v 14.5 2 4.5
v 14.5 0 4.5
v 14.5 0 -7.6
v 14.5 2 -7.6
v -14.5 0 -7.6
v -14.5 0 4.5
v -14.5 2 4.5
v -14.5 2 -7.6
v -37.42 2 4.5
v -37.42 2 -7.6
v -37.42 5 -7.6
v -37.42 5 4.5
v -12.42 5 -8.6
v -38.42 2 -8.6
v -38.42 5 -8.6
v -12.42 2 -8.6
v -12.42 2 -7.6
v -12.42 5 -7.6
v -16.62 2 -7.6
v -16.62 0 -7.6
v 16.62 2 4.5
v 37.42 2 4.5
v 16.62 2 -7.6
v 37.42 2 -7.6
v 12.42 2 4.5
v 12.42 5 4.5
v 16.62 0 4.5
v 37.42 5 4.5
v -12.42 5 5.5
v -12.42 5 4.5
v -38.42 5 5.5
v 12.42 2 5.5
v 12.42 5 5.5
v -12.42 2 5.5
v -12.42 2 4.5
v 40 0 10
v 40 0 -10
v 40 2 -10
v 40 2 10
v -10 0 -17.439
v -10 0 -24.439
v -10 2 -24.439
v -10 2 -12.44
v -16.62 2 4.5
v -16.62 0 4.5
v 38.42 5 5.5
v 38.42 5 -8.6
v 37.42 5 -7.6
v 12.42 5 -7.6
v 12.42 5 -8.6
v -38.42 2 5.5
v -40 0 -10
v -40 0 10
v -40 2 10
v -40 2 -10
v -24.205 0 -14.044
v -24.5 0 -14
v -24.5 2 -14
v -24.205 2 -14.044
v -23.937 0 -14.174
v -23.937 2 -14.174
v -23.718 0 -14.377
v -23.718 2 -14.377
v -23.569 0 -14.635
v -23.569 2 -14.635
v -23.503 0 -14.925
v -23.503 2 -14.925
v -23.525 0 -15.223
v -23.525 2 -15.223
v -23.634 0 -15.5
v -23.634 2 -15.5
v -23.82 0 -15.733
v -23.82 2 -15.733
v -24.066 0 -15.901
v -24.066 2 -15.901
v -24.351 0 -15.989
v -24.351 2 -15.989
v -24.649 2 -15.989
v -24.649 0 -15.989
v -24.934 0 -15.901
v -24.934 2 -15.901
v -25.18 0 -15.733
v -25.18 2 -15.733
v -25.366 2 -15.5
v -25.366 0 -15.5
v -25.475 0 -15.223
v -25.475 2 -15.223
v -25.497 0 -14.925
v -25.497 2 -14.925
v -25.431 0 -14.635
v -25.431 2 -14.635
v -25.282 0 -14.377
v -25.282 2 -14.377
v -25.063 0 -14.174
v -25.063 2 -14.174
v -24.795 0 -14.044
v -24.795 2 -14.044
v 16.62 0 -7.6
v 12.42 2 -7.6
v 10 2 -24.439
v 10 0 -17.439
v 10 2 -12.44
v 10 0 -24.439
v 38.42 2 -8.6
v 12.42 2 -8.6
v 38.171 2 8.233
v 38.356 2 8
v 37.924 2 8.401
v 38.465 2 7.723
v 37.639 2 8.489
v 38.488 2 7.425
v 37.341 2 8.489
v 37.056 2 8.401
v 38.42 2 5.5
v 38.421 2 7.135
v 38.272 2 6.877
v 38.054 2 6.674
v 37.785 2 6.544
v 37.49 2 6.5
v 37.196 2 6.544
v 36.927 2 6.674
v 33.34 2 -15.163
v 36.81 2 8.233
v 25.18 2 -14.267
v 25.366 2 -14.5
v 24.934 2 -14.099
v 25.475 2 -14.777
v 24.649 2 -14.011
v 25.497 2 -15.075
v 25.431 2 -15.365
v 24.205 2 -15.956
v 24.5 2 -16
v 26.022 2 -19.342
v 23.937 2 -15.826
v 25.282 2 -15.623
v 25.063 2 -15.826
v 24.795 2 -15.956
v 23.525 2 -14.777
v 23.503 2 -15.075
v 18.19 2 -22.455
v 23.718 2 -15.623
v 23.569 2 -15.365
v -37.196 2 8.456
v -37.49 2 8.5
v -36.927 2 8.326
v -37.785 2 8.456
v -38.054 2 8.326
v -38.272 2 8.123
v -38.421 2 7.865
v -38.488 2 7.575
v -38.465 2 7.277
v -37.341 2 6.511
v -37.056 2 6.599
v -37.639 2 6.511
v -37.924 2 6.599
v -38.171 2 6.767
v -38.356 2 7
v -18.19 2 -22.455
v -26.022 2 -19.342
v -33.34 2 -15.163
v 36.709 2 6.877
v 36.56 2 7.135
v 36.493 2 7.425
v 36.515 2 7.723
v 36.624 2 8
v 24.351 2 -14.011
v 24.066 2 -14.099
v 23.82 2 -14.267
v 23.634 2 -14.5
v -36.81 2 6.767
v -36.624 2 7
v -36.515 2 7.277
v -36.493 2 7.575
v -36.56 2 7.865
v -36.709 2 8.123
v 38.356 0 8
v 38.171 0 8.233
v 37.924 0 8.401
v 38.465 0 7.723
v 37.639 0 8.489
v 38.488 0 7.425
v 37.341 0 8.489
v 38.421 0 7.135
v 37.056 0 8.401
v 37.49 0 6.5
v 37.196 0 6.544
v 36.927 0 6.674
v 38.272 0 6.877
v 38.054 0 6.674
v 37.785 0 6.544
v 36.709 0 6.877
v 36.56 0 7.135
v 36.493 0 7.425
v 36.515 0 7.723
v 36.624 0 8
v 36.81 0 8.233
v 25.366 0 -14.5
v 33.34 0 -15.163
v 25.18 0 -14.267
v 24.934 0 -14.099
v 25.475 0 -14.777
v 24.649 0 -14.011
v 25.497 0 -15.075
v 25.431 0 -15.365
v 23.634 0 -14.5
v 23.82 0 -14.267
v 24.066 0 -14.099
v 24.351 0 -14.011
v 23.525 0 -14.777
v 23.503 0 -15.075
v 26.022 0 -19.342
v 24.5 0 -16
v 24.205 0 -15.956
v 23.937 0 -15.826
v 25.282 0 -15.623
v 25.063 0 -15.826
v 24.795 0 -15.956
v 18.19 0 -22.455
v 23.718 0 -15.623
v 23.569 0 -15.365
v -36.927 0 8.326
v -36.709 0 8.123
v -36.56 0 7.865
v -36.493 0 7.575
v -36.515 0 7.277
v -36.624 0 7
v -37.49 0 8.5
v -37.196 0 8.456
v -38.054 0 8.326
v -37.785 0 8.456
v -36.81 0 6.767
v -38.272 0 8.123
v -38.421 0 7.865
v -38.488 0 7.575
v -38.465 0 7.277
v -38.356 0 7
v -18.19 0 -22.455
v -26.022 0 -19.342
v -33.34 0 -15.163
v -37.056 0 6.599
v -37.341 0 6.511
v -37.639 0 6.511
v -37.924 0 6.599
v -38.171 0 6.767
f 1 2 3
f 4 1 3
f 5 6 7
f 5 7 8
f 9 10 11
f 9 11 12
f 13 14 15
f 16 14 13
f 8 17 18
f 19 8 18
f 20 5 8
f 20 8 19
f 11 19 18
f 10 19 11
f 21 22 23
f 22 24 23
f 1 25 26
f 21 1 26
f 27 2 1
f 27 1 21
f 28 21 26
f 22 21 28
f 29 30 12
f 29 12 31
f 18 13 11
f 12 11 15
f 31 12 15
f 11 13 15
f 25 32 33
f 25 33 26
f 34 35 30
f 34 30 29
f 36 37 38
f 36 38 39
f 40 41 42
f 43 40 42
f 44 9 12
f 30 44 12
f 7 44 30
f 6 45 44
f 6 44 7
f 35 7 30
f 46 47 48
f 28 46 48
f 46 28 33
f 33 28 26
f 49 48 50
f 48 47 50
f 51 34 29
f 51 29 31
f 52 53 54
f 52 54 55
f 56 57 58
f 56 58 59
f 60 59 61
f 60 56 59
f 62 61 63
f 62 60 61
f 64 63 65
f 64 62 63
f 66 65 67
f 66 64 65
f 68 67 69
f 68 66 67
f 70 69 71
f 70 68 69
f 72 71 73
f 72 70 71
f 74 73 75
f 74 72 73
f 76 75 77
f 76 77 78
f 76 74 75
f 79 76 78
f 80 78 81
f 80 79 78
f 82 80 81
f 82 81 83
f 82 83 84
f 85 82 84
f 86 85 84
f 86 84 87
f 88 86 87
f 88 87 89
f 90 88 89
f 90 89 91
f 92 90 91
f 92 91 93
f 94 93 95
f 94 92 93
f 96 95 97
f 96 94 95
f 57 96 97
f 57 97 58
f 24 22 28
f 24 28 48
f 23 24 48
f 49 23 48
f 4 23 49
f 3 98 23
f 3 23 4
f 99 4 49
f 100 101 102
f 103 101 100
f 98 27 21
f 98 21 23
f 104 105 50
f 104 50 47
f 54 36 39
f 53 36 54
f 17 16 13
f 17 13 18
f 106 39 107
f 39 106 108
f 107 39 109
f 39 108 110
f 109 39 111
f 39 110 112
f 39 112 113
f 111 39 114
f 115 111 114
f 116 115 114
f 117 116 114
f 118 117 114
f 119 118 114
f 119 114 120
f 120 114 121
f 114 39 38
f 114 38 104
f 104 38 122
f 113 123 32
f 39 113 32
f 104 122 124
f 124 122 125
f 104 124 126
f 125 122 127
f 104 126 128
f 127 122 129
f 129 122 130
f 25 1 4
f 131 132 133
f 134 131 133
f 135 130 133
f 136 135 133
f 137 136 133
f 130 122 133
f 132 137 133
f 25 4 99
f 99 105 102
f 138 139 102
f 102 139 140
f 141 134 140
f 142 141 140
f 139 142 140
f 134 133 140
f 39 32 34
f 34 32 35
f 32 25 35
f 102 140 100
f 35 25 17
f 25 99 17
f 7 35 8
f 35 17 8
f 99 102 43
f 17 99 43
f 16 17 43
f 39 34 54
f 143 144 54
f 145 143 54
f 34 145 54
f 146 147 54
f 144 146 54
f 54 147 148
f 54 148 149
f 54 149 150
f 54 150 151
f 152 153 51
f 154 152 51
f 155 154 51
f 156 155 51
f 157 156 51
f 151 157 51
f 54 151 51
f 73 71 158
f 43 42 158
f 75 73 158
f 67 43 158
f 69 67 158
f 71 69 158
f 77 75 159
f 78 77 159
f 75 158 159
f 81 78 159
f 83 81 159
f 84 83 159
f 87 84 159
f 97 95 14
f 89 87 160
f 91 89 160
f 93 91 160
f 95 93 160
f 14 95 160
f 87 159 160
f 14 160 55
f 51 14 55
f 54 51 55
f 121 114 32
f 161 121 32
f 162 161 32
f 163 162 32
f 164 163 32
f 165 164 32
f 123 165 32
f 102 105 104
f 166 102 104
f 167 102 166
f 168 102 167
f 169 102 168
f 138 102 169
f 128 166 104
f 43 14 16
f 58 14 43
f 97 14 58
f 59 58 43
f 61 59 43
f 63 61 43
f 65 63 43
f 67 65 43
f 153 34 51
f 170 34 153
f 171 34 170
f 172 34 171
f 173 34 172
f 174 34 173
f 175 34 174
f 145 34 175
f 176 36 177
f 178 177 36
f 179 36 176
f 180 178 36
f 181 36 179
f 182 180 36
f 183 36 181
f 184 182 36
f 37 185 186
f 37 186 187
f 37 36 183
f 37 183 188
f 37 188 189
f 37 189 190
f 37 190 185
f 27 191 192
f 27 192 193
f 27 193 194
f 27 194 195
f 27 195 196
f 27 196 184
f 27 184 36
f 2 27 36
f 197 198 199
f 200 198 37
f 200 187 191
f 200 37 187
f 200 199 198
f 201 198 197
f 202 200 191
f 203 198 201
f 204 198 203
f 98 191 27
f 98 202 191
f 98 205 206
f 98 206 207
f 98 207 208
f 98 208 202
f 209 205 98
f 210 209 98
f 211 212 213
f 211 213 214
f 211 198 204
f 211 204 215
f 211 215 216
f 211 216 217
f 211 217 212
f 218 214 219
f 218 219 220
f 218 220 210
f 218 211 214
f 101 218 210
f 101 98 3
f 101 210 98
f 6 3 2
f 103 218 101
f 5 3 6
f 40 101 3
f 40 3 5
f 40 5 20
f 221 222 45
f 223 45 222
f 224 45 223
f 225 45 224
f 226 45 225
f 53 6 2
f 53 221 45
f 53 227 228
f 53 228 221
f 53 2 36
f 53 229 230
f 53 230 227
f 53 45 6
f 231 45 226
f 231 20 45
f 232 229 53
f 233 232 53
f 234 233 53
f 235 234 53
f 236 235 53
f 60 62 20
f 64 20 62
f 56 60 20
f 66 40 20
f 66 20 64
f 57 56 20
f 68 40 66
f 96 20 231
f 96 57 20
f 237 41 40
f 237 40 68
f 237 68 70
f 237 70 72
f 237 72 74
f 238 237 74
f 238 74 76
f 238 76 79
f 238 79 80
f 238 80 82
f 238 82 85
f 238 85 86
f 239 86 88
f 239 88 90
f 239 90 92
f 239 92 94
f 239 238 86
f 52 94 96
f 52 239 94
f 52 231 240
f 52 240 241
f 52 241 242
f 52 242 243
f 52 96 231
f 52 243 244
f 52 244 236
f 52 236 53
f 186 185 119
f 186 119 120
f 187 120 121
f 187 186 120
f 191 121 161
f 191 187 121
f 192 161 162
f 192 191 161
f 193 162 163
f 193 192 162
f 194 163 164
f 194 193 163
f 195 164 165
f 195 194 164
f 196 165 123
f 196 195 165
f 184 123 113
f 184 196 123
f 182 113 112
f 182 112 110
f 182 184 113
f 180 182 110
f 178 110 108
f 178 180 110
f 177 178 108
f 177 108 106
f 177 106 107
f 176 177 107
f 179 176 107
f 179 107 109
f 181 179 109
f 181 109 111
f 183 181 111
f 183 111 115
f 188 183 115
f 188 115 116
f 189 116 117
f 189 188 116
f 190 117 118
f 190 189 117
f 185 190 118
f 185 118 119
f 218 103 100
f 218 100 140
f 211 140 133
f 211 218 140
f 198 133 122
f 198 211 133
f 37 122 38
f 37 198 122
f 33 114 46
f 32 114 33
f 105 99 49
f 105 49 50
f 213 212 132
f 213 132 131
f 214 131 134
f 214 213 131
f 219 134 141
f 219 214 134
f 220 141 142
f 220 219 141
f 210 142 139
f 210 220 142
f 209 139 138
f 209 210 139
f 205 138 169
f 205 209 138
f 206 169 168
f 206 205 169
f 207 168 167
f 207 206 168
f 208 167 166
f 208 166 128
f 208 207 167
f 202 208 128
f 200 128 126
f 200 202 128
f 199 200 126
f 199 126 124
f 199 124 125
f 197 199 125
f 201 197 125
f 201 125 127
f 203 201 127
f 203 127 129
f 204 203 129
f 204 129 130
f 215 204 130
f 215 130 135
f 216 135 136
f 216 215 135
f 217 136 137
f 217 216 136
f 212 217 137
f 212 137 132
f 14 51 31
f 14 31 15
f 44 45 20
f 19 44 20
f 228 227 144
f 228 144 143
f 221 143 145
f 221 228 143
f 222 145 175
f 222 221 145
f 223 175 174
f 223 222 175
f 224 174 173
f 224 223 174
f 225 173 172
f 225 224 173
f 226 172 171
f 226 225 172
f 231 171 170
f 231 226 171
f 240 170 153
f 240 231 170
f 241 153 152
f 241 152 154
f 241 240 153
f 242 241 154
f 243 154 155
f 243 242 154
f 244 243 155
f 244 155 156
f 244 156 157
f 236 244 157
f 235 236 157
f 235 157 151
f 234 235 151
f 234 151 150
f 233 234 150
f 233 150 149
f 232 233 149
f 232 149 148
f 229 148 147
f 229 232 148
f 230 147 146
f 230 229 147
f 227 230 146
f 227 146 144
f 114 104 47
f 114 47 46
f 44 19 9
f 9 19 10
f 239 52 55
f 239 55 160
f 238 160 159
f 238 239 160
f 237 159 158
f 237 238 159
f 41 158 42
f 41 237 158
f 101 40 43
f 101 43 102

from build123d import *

# Parameters (mm, degrees)
SKETCH2_R           = 1
SKETCH2_W           = 2.12
SKETCH2_H           = 12.1
BOSS_EXTRUDE2_DEPTH = 2
BOSS_EXTRUDE3_DEPTH = 3
CHAMFER1_SIZE2      = 2
CHAMFER1_SIZE       = 5


with BuildPart() as part:
    # Sketch2 → Boss-Extrude2 (new body)
    with BuildSketch(Plane(origin=(0, 0, 0), x_dir=(1, 0, 0), z_dir=(0, 1, 0))):
        with BuildLine():
            Line((-10, 24.439438281), (-10, 17.439438281))
            Line((-10, 17.439438281), (10, 17.439438281))
            Line((10, 17.439438281), (10, 24.439438281))
            ThreePointArc((10, 24.439438281), (26.021613026, 19.342266443), (40, 10))
            Line((40, 10), (40, -10))
            Line((40, -10), (-40, -10))
            Line((-40, -10), (-40, 10))
            ThreePointArc((-40, 10), (-26.021613026, 19.342266443), (-10, 24.439438281))
        make_face()
        with Locations(Location((-37.490381057, -7.5, 0), (0, 0, 270))):
            Circle(SKETCH2_R, mode=Mode.SUBTRACT)
        with Locations(Location((37.490381057, -7.5, 0), (0, 0, 90))):
            Circle(SKETCH2_R, mode=Mode.SUBTRACT)
        with Locations(Location((-24.5, 15, 0), (0, 0, 270))):
            Circle(SKETCH2_R, mode=Mode.SUBTRACT)
        with Locations(Location((24.5, 15, 0), (0, 0, 90))):
            Circle(SKETCH2_R, mode=Mode.SUBTRACT)
        with Locations((15.56, 1.55)):
            Rectangle(SKETCH2_W, SKETCH2_H, mode=Mode.SUBTRACT)
        with Locations((-15.56, 1.55)):
            Rectangle(SKETCH2_W, SKETCH2_H, mode=Mode.SUBTRACT)
    extrude(amount=BOSS_EXTRUDE2_DEPTH)

    # Sketch3 → Boss-Extrude3 (add)
    with BuildSketch(Plane(origin=(0, 2, 0), x_dir=(1, 0, 0), z_dir=(0, 1, 0))):
        Polygon((12.419999998, -4.5), (37.42, -4.5), (37.42, 7.6), (12.419999998, 7.6), (12.419999998, 8.599999996), (38.419999998, 8.599999996), (38.419999998, -5.499999996), (12.419999998, -5.499999996), align=None)
        Polygon((-12.419999998, -4.5), (-12.419999998, -5.499999996), (-38.419999998, -5.499999996), (-38.419999998, 8.599999996), (-12.419999998, 8.599999996), (-12.419999998, 7.6), (-37.42, 7.6), (-37.42, -4.5), align=None)
    extrude(amount=BOSS_EXTRUDE3_DEPTH)

    # Chamfer1
    chamfer1_edges = [part.edges().sort_by_distance(p)[0] for p in [
        (0, 2, -17.439438281),
    ]]
    chamfer1_side = [part.faces().sort_by_distance(p)[0] for p in [
        (0, 2, -17.399438281),
    ]]
    chamfer(chamfer1_edges, length=CHAMFER1_SIZE - 0.0001, length2=CHAMFER1_SIZE2 - 0.0001, reference=chamfer1_side[0])  # a hair under: the kernel refuses the full size


solid = part.part
